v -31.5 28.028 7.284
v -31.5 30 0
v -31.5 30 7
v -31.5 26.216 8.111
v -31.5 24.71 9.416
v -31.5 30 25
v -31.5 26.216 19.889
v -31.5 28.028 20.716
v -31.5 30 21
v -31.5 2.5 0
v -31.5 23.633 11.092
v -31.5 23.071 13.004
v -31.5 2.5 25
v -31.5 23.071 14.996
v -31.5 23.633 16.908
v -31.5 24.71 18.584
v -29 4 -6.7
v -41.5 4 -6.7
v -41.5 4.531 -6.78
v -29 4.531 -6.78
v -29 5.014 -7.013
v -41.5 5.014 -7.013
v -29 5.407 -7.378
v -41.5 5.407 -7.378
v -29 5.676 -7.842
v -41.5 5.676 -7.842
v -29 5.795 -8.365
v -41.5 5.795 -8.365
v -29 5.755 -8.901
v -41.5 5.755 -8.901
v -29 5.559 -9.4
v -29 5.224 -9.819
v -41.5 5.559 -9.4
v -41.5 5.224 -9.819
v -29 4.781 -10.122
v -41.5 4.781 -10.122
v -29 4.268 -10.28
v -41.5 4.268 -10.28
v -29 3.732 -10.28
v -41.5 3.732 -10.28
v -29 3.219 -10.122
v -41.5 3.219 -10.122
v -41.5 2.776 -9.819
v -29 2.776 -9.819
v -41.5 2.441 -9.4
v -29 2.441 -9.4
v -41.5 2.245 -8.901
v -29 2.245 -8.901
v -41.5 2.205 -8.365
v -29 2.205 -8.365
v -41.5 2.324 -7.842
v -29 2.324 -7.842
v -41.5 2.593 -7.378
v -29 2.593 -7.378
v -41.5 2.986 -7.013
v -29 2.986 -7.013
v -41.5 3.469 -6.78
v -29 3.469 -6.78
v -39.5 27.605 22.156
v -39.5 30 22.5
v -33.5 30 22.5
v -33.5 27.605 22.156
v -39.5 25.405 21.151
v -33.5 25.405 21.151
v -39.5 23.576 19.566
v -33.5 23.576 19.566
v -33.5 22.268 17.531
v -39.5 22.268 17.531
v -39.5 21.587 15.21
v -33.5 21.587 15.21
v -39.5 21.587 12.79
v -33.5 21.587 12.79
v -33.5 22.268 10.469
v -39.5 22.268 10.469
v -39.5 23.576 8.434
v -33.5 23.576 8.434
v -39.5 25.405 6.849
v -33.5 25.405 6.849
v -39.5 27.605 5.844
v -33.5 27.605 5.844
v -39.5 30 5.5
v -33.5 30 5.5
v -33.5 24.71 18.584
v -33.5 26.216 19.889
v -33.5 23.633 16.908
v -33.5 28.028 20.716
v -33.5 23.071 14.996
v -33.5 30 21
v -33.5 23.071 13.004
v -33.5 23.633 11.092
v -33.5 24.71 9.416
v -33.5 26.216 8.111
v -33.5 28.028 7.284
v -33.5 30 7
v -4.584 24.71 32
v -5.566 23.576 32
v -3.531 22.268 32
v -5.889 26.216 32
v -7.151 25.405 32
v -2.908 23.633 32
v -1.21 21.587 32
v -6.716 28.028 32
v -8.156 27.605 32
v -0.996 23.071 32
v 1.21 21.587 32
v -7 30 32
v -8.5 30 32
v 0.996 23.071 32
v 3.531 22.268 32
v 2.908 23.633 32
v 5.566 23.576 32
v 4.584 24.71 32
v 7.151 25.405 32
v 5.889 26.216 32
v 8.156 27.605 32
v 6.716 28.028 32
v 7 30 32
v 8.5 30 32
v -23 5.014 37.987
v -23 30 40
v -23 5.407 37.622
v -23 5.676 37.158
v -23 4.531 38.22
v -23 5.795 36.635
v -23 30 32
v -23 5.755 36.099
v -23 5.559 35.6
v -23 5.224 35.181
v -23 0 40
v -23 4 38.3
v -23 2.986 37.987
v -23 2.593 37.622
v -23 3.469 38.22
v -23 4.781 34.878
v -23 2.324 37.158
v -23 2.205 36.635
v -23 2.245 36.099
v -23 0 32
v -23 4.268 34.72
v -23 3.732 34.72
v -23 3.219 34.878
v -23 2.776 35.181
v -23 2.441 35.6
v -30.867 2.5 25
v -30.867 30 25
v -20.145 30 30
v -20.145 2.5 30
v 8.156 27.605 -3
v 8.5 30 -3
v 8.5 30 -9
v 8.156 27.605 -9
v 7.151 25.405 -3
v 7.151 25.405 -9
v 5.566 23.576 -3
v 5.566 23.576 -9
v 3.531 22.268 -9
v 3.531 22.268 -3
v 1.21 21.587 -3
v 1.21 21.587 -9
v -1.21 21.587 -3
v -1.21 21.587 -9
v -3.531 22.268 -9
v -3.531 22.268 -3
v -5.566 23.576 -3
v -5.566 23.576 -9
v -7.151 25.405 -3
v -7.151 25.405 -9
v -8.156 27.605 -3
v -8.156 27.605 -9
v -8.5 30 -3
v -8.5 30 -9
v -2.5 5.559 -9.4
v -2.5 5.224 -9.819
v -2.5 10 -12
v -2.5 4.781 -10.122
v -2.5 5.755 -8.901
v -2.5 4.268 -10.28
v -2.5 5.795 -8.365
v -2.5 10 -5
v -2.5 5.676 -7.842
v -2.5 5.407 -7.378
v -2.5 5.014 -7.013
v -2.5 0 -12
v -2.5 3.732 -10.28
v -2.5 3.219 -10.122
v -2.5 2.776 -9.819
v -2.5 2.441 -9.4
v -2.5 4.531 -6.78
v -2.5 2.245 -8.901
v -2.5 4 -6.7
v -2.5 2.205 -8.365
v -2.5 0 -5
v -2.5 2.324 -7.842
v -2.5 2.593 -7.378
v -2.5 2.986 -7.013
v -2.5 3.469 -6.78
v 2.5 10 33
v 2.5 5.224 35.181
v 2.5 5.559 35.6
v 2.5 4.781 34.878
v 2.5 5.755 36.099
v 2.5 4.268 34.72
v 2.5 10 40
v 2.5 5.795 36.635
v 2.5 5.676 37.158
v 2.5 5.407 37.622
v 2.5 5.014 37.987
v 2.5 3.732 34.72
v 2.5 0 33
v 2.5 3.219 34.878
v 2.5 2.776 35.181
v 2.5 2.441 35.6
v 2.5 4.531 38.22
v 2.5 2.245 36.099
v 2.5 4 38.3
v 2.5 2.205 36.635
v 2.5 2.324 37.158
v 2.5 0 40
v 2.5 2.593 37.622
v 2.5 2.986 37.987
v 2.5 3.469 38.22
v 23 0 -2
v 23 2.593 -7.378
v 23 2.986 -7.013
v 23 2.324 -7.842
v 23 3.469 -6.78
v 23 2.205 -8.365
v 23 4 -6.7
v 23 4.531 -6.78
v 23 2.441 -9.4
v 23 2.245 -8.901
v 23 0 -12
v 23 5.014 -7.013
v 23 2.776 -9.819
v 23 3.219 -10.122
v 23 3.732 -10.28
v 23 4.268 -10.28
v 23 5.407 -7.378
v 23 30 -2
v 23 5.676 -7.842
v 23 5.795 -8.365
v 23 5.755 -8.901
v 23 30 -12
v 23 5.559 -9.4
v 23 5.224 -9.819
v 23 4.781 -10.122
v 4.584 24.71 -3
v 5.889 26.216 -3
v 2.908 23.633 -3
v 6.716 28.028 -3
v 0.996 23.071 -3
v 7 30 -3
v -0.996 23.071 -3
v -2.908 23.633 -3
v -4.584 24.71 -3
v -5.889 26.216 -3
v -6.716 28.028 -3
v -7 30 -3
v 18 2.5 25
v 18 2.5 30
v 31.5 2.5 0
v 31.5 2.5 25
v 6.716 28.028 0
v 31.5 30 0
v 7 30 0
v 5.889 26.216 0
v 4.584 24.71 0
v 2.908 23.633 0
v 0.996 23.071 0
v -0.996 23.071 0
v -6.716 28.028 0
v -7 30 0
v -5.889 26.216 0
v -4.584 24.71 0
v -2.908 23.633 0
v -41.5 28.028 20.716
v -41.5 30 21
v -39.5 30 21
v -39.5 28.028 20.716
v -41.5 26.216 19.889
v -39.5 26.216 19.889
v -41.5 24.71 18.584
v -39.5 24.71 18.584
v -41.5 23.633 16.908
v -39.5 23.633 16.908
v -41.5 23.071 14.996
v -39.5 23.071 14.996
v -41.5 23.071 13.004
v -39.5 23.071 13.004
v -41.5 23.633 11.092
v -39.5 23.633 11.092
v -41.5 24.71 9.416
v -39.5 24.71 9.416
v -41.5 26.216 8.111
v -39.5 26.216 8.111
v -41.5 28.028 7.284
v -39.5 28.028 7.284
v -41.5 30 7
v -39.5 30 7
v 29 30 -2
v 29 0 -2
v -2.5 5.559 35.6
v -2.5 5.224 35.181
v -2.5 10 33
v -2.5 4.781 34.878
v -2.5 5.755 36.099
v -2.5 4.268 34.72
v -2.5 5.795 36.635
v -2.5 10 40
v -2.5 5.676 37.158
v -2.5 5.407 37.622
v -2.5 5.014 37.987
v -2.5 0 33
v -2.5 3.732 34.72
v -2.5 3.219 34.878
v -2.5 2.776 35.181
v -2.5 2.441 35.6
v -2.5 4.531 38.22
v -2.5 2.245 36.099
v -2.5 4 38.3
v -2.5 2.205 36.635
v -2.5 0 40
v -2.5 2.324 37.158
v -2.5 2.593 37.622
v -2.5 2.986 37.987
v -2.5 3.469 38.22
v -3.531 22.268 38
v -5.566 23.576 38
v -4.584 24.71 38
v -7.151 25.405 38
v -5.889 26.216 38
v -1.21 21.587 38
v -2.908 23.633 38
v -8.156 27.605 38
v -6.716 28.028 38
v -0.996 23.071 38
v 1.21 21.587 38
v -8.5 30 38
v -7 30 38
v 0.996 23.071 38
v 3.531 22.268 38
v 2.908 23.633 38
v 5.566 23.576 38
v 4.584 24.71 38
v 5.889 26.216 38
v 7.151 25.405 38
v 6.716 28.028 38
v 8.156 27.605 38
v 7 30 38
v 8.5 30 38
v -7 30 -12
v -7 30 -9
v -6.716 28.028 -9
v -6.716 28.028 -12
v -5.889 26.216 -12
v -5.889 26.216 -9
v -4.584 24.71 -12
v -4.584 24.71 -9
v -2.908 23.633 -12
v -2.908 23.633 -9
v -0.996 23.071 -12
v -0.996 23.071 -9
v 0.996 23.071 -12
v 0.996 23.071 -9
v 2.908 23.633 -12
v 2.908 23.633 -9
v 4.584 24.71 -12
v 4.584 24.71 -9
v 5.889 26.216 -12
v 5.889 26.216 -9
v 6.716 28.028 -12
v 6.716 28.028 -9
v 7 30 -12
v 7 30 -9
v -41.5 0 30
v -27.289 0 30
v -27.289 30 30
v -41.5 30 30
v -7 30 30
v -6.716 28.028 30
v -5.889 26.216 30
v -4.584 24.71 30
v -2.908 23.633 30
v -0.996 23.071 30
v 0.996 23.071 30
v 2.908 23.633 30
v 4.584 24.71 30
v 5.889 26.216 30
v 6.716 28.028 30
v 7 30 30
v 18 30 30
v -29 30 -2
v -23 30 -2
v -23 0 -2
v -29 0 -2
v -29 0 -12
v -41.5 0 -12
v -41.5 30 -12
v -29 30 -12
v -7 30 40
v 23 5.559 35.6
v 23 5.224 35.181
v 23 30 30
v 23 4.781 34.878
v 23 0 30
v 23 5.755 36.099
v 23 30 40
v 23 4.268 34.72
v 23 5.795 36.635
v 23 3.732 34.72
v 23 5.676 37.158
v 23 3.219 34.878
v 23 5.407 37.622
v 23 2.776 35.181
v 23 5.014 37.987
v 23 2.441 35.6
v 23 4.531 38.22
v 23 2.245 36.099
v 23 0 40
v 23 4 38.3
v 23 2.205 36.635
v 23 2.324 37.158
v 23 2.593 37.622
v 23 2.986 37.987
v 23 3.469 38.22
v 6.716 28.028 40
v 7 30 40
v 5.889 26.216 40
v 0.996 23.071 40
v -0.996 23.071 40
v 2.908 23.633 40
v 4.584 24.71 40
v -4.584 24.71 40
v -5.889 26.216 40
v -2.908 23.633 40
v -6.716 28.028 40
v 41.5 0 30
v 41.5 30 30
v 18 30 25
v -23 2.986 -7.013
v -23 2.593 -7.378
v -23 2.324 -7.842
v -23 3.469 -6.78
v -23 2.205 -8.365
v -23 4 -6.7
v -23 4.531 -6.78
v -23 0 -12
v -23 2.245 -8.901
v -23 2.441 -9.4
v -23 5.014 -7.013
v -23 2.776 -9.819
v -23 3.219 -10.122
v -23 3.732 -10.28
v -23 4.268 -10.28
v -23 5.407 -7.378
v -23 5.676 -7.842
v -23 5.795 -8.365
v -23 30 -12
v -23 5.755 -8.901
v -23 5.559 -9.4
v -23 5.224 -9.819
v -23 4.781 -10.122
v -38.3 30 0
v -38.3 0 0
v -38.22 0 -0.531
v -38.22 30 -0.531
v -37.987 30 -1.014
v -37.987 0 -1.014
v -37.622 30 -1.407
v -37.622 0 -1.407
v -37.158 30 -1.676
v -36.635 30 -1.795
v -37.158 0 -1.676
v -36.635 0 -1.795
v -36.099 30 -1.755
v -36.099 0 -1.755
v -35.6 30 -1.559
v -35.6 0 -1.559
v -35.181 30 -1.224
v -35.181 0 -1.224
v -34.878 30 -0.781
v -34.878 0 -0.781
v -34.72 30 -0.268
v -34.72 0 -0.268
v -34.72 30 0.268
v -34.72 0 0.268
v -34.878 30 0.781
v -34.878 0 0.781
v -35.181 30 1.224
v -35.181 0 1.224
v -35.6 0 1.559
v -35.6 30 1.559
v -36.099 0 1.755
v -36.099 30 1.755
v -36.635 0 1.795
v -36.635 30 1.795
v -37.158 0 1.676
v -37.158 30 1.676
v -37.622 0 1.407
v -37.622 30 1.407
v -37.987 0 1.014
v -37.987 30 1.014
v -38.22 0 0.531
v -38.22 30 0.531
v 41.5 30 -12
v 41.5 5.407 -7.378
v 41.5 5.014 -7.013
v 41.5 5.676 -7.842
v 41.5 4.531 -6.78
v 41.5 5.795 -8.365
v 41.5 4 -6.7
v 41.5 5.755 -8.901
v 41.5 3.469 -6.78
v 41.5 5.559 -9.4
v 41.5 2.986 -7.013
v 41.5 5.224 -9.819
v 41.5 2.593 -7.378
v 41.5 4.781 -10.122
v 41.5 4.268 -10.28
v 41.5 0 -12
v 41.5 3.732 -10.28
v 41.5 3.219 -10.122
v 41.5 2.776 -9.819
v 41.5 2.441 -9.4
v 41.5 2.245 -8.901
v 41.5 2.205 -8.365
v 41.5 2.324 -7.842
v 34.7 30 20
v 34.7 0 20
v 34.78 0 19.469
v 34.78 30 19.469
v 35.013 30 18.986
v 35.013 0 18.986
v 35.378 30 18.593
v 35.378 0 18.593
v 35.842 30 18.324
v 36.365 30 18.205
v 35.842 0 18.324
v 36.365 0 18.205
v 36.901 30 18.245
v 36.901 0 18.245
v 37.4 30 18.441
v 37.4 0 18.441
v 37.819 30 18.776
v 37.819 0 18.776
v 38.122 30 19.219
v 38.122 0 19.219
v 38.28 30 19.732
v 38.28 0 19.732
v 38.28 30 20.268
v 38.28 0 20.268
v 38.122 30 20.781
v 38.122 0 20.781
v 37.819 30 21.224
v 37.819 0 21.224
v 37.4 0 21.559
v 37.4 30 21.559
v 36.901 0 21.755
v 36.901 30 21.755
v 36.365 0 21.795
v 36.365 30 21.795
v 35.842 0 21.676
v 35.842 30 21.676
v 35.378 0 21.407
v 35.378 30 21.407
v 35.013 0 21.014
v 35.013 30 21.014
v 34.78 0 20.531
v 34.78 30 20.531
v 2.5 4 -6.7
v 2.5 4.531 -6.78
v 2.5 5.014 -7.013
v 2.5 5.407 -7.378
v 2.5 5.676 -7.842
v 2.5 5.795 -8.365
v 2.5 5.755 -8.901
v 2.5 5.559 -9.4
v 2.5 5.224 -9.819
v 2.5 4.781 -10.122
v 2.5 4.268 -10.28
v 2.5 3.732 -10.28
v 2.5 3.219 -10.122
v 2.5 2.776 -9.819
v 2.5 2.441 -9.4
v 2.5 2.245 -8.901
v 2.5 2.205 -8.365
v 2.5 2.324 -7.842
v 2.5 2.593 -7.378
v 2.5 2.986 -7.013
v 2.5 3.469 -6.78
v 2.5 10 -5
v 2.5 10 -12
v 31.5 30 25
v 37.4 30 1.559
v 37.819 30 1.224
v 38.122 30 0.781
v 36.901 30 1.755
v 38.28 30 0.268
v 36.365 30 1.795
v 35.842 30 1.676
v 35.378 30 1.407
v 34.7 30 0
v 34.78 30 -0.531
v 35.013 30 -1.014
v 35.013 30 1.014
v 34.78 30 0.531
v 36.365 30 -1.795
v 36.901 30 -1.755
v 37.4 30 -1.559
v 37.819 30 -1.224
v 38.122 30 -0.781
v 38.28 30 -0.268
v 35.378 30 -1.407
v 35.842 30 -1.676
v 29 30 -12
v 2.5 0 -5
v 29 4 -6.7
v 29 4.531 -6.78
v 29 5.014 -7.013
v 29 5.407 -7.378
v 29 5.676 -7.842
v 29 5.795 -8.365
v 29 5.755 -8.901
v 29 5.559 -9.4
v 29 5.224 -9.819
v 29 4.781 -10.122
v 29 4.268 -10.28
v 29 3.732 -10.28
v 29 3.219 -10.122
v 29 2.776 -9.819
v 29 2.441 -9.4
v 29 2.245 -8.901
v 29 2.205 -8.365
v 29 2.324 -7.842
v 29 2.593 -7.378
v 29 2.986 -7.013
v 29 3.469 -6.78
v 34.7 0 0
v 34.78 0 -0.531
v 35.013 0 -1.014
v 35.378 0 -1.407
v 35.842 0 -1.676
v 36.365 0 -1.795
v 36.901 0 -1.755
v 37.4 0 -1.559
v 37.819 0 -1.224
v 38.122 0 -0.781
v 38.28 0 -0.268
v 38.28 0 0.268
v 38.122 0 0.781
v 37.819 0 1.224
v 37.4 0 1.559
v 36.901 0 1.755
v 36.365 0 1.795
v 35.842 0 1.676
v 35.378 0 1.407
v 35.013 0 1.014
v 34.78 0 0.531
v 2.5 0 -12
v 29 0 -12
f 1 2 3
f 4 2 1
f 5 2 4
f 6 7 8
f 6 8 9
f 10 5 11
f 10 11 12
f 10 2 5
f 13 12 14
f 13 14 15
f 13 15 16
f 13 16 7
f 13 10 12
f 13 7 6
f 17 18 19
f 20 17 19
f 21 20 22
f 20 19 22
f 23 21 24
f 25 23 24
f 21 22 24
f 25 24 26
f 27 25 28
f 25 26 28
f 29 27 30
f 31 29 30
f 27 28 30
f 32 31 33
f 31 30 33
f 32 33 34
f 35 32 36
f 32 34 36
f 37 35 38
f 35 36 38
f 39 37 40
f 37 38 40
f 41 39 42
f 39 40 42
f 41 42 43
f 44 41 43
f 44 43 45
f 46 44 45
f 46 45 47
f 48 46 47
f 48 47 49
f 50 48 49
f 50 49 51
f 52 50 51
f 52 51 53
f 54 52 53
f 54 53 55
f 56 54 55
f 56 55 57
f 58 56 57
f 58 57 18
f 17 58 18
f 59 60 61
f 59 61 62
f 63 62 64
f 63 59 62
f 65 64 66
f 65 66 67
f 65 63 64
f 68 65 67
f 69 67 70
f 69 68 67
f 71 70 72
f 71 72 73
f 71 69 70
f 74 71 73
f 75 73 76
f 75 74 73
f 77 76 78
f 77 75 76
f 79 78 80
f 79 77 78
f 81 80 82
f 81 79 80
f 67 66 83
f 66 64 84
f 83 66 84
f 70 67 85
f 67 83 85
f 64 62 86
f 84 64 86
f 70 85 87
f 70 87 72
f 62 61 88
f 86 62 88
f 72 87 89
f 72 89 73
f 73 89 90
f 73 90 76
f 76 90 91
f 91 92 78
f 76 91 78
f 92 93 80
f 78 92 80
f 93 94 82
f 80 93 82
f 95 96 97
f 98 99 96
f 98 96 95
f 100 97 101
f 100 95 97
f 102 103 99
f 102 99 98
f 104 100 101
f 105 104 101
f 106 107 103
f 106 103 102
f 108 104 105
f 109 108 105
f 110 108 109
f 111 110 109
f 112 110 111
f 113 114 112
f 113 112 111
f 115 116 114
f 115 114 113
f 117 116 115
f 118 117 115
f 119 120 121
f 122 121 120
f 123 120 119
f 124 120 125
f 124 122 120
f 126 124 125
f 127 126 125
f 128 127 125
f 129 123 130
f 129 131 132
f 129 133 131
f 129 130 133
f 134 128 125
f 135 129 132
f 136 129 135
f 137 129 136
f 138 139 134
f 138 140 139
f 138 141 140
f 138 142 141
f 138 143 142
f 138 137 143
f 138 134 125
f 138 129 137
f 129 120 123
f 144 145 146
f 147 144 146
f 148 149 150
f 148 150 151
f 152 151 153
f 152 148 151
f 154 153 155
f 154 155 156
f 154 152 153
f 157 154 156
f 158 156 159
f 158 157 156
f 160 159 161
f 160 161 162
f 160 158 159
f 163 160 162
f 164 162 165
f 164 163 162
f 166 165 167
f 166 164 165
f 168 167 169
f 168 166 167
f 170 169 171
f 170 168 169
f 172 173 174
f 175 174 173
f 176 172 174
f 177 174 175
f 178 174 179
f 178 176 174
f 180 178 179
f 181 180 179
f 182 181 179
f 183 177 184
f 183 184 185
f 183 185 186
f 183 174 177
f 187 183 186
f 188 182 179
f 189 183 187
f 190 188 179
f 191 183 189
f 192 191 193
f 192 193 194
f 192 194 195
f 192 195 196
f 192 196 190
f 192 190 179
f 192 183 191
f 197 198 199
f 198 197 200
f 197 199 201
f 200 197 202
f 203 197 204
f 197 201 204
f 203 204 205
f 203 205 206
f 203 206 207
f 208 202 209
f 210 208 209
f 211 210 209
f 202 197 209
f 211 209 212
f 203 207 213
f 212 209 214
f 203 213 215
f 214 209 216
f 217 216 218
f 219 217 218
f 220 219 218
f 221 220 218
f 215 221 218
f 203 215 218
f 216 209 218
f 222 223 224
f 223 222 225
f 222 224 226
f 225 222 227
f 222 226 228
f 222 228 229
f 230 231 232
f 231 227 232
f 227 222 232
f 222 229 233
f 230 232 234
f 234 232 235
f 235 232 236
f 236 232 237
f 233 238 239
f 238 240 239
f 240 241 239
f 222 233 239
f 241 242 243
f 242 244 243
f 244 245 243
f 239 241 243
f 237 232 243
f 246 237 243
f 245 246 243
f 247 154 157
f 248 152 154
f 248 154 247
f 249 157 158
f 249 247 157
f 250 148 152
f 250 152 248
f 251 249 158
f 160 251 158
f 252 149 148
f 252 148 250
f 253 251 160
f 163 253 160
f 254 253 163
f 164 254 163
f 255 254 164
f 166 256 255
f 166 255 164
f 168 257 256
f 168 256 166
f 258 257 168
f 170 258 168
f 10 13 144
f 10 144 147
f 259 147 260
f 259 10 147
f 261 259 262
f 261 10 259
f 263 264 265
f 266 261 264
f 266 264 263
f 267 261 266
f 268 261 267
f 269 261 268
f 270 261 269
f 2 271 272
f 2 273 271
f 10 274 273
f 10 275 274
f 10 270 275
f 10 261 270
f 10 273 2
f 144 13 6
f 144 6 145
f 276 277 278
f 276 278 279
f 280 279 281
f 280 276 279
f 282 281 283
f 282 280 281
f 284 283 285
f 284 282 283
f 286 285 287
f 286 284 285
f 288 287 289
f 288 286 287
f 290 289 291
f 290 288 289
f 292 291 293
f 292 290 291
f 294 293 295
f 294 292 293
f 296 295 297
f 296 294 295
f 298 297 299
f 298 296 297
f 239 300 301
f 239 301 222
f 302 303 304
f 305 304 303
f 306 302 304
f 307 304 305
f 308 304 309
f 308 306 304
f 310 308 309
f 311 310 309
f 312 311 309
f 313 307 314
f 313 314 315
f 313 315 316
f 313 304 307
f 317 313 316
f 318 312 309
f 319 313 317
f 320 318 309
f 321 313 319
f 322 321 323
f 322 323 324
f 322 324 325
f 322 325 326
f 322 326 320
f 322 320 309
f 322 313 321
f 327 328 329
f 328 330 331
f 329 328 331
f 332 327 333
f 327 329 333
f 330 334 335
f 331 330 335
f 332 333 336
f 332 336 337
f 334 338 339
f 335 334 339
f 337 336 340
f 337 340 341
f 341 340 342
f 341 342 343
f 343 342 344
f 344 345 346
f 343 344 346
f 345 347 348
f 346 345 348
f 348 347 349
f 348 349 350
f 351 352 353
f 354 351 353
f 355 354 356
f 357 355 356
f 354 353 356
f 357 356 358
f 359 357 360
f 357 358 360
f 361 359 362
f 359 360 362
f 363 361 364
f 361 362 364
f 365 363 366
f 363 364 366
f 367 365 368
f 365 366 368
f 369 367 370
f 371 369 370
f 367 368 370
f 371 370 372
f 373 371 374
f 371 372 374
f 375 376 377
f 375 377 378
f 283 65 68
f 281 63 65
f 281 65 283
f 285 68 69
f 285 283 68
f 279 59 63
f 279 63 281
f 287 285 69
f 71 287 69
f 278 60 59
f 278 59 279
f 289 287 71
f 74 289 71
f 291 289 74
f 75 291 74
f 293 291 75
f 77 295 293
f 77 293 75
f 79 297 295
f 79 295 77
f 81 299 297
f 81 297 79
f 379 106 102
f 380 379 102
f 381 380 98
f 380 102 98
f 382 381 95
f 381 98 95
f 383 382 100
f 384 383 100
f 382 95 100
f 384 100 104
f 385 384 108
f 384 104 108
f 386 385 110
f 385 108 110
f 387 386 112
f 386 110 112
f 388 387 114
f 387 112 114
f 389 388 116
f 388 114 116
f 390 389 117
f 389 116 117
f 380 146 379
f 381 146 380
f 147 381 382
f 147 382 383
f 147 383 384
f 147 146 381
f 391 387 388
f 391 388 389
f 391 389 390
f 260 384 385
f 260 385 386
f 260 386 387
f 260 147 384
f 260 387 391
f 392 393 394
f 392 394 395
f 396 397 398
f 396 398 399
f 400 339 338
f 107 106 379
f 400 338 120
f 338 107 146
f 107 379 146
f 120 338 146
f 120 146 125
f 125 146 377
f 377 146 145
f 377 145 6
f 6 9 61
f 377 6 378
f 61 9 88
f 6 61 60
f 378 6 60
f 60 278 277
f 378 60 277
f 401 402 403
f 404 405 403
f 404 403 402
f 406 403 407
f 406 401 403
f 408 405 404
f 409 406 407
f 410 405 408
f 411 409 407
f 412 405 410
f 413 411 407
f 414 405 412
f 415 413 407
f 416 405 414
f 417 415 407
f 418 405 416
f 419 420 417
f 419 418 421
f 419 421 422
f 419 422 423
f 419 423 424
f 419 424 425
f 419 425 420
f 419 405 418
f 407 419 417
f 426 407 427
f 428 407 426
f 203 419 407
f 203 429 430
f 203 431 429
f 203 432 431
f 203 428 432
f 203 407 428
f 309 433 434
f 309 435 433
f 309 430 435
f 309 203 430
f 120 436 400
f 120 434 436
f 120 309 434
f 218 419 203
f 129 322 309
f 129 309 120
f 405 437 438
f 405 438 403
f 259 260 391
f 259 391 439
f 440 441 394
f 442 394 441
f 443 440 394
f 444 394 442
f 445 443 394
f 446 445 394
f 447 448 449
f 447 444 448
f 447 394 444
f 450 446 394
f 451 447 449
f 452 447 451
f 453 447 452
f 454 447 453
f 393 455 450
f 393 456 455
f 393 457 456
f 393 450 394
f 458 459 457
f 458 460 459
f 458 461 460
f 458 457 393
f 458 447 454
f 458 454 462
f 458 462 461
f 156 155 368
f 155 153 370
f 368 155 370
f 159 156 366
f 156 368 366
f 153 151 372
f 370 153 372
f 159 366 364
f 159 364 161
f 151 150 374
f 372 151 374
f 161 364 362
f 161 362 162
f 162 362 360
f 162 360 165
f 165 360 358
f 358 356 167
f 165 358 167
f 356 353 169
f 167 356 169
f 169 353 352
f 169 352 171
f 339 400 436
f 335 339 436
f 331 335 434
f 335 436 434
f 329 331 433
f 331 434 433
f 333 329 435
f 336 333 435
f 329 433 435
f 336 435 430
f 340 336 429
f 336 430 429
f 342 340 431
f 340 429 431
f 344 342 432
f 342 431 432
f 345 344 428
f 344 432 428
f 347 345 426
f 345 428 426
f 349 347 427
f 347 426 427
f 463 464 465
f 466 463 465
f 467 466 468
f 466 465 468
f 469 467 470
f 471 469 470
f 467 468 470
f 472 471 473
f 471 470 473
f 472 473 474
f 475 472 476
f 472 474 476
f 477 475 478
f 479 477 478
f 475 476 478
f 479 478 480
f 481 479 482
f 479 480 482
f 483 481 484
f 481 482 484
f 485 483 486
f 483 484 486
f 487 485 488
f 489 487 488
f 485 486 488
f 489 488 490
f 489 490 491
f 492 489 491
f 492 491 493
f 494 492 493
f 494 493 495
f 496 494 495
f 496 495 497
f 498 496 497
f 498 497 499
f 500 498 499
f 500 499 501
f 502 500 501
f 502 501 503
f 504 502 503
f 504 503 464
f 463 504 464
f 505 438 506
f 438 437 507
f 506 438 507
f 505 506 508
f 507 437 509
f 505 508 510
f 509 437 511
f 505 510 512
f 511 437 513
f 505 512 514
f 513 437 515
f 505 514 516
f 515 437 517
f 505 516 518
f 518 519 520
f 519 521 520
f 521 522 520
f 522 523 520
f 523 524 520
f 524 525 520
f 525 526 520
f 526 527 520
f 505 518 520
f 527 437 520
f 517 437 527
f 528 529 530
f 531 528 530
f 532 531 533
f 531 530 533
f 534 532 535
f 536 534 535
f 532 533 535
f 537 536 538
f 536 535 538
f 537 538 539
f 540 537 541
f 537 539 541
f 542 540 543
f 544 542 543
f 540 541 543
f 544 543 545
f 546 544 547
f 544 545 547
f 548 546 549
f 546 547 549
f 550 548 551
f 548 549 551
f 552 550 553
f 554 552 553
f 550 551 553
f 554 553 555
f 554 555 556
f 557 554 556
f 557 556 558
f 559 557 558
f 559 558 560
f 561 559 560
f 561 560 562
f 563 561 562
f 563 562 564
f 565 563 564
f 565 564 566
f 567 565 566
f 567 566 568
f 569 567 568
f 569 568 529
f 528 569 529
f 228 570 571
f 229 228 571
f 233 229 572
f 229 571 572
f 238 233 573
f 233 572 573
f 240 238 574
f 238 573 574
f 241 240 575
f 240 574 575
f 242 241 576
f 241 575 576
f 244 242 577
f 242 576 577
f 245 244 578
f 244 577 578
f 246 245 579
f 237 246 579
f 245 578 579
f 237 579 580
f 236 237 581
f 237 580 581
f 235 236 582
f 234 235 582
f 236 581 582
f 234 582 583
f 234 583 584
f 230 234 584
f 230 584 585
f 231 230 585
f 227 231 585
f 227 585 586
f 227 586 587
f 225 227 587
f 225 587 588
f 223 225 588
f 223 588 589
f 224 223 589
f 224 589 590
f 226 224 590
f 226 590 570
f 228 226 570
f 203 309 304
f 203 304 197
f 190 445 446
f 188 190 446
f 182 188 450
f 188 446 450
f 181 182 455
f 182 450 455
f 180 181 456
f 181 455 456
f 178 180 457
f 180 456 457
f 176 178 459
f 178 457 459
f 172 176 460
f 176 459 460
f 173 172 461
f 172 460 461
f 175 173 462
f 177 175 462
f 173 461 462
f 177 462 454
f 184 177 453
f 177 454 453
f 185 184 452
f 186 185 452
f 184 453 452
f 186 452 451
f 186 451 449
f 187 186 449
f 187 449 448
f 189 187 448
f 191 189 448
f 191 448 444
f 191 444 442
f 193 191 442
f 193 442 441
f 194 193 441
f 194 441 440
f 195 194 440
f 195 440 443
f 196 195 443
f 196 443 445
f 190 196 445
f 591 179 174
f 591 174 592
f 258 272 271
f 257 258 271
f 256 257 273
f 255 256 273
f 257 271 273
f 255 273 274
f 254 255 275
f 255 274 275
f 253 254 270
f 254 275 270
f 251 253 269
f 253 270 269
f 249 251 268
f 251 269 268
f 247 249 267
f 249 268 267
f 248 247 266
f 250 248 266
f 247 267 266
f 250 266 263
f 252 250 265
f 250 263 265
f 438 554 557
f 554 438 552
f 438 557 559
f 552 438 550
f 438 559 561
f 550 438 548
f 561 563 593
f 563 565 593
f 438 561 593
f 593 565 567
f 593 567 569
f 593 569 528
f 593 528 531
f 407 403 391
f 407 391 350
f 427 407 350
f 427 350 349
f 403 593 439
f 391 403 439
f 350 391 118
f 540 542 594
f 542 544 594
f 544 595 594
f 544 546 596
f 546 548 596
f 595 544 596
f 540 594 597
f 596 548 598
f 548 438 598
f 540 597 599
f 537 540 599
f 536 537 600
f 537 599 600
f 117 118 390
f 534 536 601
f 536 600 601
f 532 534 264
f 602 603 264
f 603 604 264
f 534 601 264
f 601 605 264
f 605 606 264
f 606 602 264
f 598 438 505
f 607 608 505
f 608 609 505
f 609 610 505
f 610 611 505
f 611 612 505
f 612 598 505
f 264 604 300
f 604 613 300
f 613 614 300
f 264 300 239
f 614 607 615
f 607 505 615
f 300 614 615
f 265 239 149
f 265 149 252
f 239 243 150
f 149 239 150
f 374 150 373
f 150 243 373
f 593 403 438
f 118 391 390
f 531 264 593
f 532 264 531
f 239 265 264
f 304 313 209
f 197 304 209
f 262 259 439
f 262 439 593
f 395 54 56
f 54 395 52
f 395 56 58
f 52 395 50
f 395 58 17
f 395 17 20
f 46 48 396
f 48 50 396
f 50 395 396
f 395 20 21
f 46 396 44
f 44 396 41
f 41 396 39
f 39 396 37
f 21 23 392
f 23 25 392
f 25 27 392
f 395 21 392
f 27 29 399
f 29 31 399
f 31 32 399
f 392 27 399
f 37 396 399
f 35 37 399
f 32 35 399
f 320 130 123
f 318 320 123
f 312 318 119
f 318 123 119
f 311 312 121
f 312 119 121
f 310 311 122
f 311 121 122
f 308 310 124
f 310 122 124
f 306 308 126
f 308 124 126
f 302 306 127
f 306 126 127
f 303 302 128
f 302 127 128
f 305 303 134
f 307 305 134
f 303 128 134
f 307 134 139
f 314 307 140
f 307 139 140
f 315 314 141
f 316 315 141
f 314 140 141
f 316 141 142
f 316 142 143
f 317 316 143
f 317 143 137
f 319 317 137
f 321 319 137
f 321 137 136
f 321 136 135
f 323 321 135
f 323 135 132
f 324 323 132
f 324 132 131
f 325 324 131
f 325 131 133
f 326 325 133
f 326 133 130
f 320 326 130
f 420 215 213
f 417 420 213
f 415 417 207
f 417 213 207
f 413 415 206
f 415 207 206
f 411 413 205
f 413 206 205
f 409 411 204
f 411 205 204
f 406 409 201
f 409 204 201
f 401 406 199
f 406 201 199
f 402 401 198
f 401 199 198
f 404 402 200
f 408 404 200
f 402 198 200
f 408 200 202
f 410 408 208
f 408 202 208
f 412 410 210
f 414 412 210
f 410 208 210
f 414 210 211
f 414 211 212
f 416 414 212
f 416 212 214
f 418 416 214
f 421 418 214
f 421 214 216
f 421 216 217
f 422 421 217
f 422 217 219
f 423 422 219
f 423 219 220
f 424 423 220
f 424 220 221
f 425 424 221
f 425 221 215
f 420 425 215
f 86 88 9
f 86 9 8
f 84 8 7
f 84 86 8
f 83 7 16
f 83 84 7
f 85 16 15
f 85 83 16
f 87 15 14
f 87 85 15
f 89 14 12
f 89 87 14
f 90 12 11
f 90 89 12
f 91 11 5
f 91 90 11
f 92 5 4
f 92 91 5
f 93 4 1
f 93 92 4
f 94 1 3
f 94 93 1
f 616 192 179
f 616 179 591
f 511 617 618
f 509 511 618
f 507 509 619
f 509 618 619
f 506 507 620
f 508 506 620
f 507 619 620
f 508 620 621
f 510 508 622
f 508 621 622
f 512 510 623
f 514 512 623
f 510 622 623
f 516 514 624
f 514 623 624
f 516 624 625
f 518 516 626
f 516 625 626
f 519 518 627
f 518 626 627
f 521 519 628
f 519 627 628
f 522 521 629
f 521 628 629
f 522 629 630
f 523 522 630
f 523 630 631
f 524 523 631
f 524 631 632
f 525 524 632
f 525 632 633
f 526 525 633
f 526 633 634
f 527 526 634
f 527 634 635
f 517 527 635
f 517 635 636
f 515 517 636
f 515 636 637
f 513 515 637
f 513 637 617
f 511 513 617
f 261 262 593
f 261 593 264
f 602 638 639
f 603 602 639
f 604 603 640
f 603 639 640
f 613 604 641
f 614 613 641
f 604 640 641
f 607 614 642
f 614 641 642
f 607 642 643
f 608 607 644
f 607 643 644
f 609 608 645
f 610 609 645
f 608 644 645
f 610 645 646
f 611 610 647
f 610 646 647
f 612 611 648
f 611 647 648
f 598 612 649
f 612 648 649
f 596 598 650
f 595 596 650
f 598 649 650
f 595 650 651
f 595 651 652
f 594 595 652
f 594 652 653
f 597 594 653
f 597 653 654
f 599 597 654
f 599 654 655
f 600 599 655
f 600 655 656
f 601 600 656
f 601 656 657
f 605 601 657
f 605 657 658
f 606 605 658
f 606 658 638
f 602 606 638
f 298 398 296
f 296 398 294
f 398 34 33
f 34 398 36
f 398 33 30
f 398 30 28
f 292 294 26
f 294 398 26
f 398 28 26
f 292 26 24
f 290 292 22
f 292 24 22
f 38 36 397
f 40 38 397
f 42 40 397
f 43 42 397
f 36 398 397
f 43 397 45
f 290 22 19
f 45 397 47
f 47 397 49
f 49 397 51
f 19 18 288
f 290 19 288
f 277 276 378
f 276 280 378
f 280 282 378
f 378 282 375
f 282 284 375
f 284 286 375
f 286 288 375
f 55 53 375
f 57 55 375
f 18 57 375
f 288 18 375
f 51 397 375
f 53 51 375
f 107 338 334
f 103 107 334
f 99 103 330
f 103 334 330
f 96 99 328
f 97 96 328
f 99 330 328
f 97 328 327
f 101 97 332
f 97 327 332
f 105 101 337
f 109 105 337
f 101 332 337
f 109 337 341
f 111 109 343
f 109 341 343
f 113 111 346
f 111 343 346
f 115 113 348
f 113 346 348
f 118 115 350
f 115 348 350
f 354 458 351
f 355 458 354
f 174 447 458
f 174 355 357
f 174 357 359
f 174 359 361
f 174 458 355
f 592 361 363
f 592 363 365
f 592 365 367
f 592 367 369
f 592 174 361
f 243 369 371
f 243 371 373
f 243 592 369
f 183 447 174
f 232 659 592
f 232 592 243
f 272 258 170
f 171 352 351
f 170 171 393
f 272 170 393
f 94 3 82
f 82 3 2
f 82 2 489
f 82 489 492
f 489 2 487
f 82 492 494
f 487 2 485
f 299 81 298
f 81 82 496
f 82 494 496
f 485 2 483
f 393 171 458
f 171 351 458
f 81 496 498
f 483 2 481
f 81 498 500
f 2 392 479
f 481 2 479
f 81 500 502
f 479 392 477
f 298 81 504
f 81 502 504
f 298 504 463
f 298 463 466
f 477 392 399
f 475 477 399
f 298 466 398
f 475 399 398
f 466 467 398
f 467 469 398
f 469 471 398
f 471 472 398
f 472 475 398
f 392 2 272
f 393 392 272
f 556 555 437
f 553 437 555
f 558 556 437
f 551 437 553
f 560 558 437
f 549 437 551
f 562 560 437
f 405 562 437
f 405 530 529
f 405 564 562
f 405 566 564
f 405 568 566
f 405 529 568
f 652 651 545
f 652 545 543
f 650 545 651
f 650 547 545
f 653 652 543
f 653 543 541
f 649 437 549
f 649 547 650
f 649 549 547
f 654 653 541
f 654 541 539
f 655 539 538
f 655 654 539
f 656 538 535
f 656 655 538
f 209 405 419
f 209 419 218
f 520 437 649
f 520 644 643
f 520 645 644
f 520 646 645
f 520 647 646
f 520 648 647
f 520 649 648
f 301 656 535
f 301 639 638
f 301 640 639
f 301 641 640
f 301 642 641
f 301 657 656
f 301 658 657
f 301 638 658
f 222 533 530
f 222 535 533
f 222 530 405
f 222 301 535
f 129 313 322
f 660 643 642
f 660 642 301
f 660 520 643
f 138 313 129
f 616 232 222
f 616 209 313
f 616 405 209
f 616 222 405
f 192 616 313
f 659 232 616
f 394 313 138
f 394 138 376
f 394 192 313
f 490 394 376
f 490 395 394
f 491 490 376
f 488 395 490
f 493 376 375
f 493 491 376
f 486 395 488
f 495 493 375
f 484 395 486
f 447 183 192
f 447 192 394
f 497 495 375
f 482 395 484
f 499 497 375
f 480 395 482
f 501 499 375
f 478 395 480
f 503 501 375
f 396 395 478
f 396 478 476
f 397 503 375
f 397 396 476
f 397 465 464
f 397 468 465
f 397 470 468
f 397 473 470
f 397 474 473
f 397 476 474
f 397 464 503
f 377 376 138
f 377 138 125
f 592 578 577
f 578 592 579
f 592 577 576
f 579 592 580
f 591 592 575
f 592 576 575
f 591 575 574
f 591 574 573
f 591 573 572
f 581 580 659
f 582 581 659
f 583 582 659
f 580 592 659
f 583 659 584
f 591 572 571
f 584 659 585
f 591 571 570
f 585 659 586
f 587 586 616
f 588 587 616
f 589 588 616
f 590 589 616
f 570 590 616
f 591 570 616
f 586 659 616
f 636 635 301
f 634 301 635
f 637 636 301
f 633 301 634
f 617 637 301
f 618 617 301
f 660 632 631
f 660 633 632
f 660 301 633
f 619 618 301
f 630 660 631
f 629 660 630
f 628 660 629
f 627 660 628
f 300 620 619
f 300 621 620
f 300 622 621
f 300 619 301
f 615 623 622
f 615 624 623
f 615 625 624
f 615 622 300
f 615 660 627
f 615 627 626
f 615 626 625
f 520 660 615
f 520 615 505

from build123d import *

# Parameters (mm, degrees)
BOSS_EXTRUDE1_DEPTH  = 30
CUT_EXTRUDE2_START   = 2.5
CUT_EXTRUDE2_DEPTH   = 27.5
CUT_EXTRUDE3_START   = -2
SKETCH3_R            = 8.5
CUT_EXTRUDE3_DEPTH   = 6
CUT_EXTRUDE4_START   = -9
SKETCH4_R            = 8.5
CUT_EXTRUDE4_DEPTH   = 6
CUT_EXTRUDE6_DEPTH   = 73.981161953
SKETCH16_W           = 6
SKETCH16_H           = 30
CUT_EXTRUDE7_DEPTH   = 10
CUT_EXTRUDE8_START   = 2
SKETCH17_R           = 8.5
CUT_EXTRUDE8_DEPTH   = 6
CUT_EXTRUDE9_REACH   = 98.897
CHAMFER1_SIZE        = 2
CHAMFER1_SIZE2       = 4.289013841
CHAMFER2_SIZE        = 12.867041523
CHAMFER2_SIZE_2      = 6
SKETCH19_W           = 5
SKETCH19_H           = 7
CUT_EXTRUDE11_DEPTH  = 10
M3_CLEARANCE_HOLE1_D = 3.6
M3_CLEARANCE_HOLE2_D = 3.6


with BuildPart() as part:
    # Sketch1 → Boss-Extrude1 (new body)
    with BuildSketch(Plane(origin=(0, 0, 0), x_dir=(1, 0, 0), z_dir=(0, 1, 0))):
        Polygon((-41.5, 12), (41.5, 12), (41.5, -15), (41.5, -30), (23, -30), (23, -40), (-23, -40), (-23, -30), (-41.5, -30), (-41.5, -15), align=None)
    extrude(amount=BOSS_EXTRUDE1_DEPTH)

    # Sketch1<4> → Cut-Extrude2 (cut)
    with BuildSketch(Plane(origin=(0, 0, 0), x_dir=(1, 0, 0), z_dir=(0, 1, 0)).offset(CUT_EXTRUDE2_START)):
        Polygon((31.5, 0), (-31.5, 0), (-31.5, -10), (-31.5, -25), (-18, -25), (-18, -30), (18, -30), (18, -25), (31.5, -25), (31.5, -10), align=None)
    extrude(amount=CUT_EXTRUDE2_DEPTH, mode=Mode.SUBTRACT)

    # Sketch3 → Cut-Extrude3 (cut)
    with BuildSketch(Plane.XY.offset(40).offset(CUT_EXTRUDE3_START)):
        with Locations((0, 30)):
            Circle(SKETCH3_R)
    extrude(amount=-CUT_EXTRUDE3_DEPTH, mode=Mode.SUBTRACT)

    # Sketch4 → Cut-Extrude4 (cut)
    with BuildSketch(Plane(origin=(0, 0, -12), x_dir=(-1, 0, 0), z_dir=(0, 0, -1)).offset(CUT_EXTRUDE4_START)):
        with Locations((0, 30)):
            Circle(SKETCH4_R)
    extrude(amount=CUT_EXTRUDE4_DEPTH, mode=Mode.SUBTRACT)

    # Sketch3<4> → Cut-Extrude6 (cut, through all)
    with BuildSketch(Plane.XY.offset(40)):
        with BuildLine():
            Line((-7, 30), (7, 30))
            ThreePointArc((7, 30), (0, 37), (-7, 30))
        make_face()
        with BuildLine():
            ThreePointArc((-7, 30), (0, 23), (7, 30))
            Line((7, 30), (-7, 30))
        make_face()
        with BuildLine():
            Line((-7, 30), (7, 30))
            ThreePointArc((7, 30), (0, 37), (-7, 30))
        make_face()
        with BuildLine():
            ThreePointArc((-7, 30), (0, 23), (7, 30))
            Line((7, 30), (-7, 30))
        make_face()
    extrude(amount=-CUT_EXTRUDE6_DEPTH, mode=Mode.SUBTRACT)

    # Sketch16 → Cut-Extrude7 (cut)
    with BuildSketch(Plane(origin=(0, 0, -12), x_dir=(-1, 0, 0), z_dir=(0, 0, -1))):
        with Locations((26, 15)):
            Rectangle(SKETCH16_W, SKETCH16_H)
        with Locations((-26, 15)):
            Rectangle(SKETCH16_W, SKETCH16_H)
    extrude(amount=-CUT_EXTRUDE7_DEPTH, mode=Mode.SUBTRACT)

    # Sketch17 → Cut-Extrude8 (cut)
    with BuildSketch(Plane(origin=(-41.5, 0, 0), x_dir=(0, 0, -1), z_dir=(1, 0, 0)).offset(CUT_EXTRUDE8_START)):
        with Locations((-14, 30)):
            Circle(SKETCH17_R)
    extrude(amount=CUT_EXTRUDE8_DEPTH, mode=Mode.SUBTRACT)

    # Cut-Extrude9: up to this face of the body (flat: up to its plane)
    cut_extrude9_end = Plane(part.part.faces().sort_by_distance((-31.5, 16.25, 12.5))[0])
    # Sketch17<3> → Cut-Extrude9 (cut, up to the picked face)
    with BuildSketch(Plane(origin=(-41.5, 0, 0), x_dir=(0, 0, -1), z_dir=(1, 0, 0)), mode=Mode.PRIVATE) as cut_extrude9_sk1:
        with BuildLine():
            Line((-21, 30), (-7, 30))
            ThreePointArc((-7, 30), (-14, 37), (-21, 30))
        make_face()
    cut_extrude9_tool1 = split(extrude(cut_extrude9_sk1.sketch, amount=CUT_EXTRUDE9_REACH, mode=Mode.PRIVATE), bisect_by=cut_extrude9_end, keep=Keep.BOTH, mode=Mode.PRIVATE)
    # Sketch17<3> → Cut-Extrude9 (cut, up to the picked face)
    with BuildSketch(Plane(origin=(-41.5, 0, 0), x_dir=(0, 0, -1), z_dir=(1, 0, 0)), mode=Mode.PRIVATE) as cut_extrude9_sk2:
        with BuildLine():
            ThreePointArc((-21, 30), (-14, 23), (-7, 30))
            Line((-7, 30), (-21, 30))
        make_face()
    cut_extrude9_tool2 = split(extrude(cut_extrude9_sk2.sketch, amount=CUT_EXTRUDE9_REACH, mode=Mode.PRIVATE), bisect_by=cut_extrude9_end, keep=Keep.BOTH, mode=Mode.PRIVATE)
    # Sketch17<3> → Cut-Extrude9 (cut, up to the picked face)
    with BuildSketch(Plane(origin=(-41.5, 0, 0), x_dir=(0, 0, -1), z_dir=(1, 0, 0)), mode=Mode.PRIVATE) as cut_extrude9_sk3:
        with BuildLine():
            Line((-21, 30), (-7, 30))
            ThreePointArc((-7, 30), (-14, 37), (-21, 30))
        make_face()
    cut_extrude9_tool3 = split(extrude(cut_extrude9_sk3.sketch, amount=CUT_EXTRUDE9_REACH, mode=Mode.PRIVATE), bisect_by=cut_extrude9_end, keep=Keep.BOTH, mode=Mode.PRIVATE)
    # Sketch17<3> → Cut-Extrude9 (cut, up to the picked face)
    with BuildSketch(Plane(origin=(-41.5, 0, 0), x_dir=(0, 0, -1), z_dir=(1, 0, 0)), mode=Mode.PRIVATE) as cut_extrude9_sk4:
        with BuildLine():
            ThreePointArc((-21, 30), (-14, 23), (-7, 30))
            Line((-7, 30), (-21, 30))
        make_face()
    cut_extrude9_tool4 = split(extrude(cut_extrude9_sk4.sketch, amount=CUT_EXTRUDE9_REACH, mode=Mode.PRIVATE), bisect_by=cut_extrude9_end, keep=Keep.BOTH, mode=Mode.PRIVATE)
    add(cut_extrude9_tool1.solids().sort_by(Axis((-41.5, 32.970892, 14), (1, 0, 0)))[0], mode=Mode.SUBTRACT)
    add(cut_extrude9_tool2.solids().sort_by(Axis((-41.5, 27.029108, 14), (1, 0, 0)))[0], mode=Mode.SUBTRACT)
    add(cut_extrude9_tool3.solids().sort_by(Axis((-41.5, 32.970892, 14), (1, 0, 0)))[0], mode=Mode.SUBTRACT)
    add(cut_extrude9_tool4.solids().sort_by(Axis((-41.5, 27.029108, 14), (1, 0, 0)))[0], mode=Mode.SUBTRACT)

    # Chamfer1
    chamfer1_edges = [part.edges().sort_by_distance(p)[0] for p in [
        (-23, 15, 30),
    ]]
    chamfer1_side = [part.faces().sort_by_distance(p)[0] for p in [
        (-23, 15, 35),
    ]]
    chamfer(chamfer1_edges, length=CHAMFER1_SIZE, length2=CHAMFER1_SIZE2, reference=chamfer1_side[0])

    # Chamfer2
    # the kernel refuses this chamfer: 12.867041523, 6 mm, written as the material it takes off along each edge
    with BuildSketch(Plane(origin=(-18, 2.5, 25), x_dir=(-0.9998669641130704, 0, -0.016311164131110355), z_dir=(0, 1, 0))) as chamfer2_piece_1_section:
        Polygon((CHAMFER2_SIZE * 0.999866964118, CHAMFER2_SIZE * 0.0163111641312), (-CHAMFER2_SIZE_2 * 0.0163111641311, CHAMFER2_SIZE_2 * 0.999866964113), (0, 0), align=None)
    chamfer2_piece_1 = extrude(amount=60.838188976, mode=Mode.PRIVATE)
    chamfer2_piece_1 = split(chamfer2_piece_1, bisect_by=Plane(origin=(-22.391133218, 16.25, 30), z_dir=(0, 0, -1)), keep=Keep.TOP, mode=Mode.PRIVATE)
    add(chamfer2_piece_1, mode=Mode.SUBTRACT)

    # Sketch19 → Cut-Extrude11 (cut)
    with BuildSketch(Plane.XZ):
        with Locations((0, -8.5)):
            Rectangle(SKETCH19_W, SKETCH19_H)
        with Locations((0, 36.5)):
            Rectangle(SKETCH19_W, SKETCH19_H)
    extrude(amount=-CUT_EXTRUDE11_DEPTH, mode=Mode.SUBTRACT)

    # M3 Clearance Hole1 (through all)
    with Locations(Plane(origin=(41.5, 0, 0), x_dir=(0, 0, -1), z_dir=(1, 0, 0))):
        with Locations((8.5, 4), (-36.5, 4)):
            Hole(M3_CLEARANCE_HOLE1_D / 2)

    # M3 Clearance Hole2 (through all)
    with Locations(Plane(origin=(0, 30, 0), x_dir=(1, 0, 0), z_dir=(0, 1, 0))):
        with Locations((-36.5, 0), (36.5, 0), (36.5, -20)):
            Hole(M3_CLEARANCE_HOLE2_D / 2)


solid = part.part
